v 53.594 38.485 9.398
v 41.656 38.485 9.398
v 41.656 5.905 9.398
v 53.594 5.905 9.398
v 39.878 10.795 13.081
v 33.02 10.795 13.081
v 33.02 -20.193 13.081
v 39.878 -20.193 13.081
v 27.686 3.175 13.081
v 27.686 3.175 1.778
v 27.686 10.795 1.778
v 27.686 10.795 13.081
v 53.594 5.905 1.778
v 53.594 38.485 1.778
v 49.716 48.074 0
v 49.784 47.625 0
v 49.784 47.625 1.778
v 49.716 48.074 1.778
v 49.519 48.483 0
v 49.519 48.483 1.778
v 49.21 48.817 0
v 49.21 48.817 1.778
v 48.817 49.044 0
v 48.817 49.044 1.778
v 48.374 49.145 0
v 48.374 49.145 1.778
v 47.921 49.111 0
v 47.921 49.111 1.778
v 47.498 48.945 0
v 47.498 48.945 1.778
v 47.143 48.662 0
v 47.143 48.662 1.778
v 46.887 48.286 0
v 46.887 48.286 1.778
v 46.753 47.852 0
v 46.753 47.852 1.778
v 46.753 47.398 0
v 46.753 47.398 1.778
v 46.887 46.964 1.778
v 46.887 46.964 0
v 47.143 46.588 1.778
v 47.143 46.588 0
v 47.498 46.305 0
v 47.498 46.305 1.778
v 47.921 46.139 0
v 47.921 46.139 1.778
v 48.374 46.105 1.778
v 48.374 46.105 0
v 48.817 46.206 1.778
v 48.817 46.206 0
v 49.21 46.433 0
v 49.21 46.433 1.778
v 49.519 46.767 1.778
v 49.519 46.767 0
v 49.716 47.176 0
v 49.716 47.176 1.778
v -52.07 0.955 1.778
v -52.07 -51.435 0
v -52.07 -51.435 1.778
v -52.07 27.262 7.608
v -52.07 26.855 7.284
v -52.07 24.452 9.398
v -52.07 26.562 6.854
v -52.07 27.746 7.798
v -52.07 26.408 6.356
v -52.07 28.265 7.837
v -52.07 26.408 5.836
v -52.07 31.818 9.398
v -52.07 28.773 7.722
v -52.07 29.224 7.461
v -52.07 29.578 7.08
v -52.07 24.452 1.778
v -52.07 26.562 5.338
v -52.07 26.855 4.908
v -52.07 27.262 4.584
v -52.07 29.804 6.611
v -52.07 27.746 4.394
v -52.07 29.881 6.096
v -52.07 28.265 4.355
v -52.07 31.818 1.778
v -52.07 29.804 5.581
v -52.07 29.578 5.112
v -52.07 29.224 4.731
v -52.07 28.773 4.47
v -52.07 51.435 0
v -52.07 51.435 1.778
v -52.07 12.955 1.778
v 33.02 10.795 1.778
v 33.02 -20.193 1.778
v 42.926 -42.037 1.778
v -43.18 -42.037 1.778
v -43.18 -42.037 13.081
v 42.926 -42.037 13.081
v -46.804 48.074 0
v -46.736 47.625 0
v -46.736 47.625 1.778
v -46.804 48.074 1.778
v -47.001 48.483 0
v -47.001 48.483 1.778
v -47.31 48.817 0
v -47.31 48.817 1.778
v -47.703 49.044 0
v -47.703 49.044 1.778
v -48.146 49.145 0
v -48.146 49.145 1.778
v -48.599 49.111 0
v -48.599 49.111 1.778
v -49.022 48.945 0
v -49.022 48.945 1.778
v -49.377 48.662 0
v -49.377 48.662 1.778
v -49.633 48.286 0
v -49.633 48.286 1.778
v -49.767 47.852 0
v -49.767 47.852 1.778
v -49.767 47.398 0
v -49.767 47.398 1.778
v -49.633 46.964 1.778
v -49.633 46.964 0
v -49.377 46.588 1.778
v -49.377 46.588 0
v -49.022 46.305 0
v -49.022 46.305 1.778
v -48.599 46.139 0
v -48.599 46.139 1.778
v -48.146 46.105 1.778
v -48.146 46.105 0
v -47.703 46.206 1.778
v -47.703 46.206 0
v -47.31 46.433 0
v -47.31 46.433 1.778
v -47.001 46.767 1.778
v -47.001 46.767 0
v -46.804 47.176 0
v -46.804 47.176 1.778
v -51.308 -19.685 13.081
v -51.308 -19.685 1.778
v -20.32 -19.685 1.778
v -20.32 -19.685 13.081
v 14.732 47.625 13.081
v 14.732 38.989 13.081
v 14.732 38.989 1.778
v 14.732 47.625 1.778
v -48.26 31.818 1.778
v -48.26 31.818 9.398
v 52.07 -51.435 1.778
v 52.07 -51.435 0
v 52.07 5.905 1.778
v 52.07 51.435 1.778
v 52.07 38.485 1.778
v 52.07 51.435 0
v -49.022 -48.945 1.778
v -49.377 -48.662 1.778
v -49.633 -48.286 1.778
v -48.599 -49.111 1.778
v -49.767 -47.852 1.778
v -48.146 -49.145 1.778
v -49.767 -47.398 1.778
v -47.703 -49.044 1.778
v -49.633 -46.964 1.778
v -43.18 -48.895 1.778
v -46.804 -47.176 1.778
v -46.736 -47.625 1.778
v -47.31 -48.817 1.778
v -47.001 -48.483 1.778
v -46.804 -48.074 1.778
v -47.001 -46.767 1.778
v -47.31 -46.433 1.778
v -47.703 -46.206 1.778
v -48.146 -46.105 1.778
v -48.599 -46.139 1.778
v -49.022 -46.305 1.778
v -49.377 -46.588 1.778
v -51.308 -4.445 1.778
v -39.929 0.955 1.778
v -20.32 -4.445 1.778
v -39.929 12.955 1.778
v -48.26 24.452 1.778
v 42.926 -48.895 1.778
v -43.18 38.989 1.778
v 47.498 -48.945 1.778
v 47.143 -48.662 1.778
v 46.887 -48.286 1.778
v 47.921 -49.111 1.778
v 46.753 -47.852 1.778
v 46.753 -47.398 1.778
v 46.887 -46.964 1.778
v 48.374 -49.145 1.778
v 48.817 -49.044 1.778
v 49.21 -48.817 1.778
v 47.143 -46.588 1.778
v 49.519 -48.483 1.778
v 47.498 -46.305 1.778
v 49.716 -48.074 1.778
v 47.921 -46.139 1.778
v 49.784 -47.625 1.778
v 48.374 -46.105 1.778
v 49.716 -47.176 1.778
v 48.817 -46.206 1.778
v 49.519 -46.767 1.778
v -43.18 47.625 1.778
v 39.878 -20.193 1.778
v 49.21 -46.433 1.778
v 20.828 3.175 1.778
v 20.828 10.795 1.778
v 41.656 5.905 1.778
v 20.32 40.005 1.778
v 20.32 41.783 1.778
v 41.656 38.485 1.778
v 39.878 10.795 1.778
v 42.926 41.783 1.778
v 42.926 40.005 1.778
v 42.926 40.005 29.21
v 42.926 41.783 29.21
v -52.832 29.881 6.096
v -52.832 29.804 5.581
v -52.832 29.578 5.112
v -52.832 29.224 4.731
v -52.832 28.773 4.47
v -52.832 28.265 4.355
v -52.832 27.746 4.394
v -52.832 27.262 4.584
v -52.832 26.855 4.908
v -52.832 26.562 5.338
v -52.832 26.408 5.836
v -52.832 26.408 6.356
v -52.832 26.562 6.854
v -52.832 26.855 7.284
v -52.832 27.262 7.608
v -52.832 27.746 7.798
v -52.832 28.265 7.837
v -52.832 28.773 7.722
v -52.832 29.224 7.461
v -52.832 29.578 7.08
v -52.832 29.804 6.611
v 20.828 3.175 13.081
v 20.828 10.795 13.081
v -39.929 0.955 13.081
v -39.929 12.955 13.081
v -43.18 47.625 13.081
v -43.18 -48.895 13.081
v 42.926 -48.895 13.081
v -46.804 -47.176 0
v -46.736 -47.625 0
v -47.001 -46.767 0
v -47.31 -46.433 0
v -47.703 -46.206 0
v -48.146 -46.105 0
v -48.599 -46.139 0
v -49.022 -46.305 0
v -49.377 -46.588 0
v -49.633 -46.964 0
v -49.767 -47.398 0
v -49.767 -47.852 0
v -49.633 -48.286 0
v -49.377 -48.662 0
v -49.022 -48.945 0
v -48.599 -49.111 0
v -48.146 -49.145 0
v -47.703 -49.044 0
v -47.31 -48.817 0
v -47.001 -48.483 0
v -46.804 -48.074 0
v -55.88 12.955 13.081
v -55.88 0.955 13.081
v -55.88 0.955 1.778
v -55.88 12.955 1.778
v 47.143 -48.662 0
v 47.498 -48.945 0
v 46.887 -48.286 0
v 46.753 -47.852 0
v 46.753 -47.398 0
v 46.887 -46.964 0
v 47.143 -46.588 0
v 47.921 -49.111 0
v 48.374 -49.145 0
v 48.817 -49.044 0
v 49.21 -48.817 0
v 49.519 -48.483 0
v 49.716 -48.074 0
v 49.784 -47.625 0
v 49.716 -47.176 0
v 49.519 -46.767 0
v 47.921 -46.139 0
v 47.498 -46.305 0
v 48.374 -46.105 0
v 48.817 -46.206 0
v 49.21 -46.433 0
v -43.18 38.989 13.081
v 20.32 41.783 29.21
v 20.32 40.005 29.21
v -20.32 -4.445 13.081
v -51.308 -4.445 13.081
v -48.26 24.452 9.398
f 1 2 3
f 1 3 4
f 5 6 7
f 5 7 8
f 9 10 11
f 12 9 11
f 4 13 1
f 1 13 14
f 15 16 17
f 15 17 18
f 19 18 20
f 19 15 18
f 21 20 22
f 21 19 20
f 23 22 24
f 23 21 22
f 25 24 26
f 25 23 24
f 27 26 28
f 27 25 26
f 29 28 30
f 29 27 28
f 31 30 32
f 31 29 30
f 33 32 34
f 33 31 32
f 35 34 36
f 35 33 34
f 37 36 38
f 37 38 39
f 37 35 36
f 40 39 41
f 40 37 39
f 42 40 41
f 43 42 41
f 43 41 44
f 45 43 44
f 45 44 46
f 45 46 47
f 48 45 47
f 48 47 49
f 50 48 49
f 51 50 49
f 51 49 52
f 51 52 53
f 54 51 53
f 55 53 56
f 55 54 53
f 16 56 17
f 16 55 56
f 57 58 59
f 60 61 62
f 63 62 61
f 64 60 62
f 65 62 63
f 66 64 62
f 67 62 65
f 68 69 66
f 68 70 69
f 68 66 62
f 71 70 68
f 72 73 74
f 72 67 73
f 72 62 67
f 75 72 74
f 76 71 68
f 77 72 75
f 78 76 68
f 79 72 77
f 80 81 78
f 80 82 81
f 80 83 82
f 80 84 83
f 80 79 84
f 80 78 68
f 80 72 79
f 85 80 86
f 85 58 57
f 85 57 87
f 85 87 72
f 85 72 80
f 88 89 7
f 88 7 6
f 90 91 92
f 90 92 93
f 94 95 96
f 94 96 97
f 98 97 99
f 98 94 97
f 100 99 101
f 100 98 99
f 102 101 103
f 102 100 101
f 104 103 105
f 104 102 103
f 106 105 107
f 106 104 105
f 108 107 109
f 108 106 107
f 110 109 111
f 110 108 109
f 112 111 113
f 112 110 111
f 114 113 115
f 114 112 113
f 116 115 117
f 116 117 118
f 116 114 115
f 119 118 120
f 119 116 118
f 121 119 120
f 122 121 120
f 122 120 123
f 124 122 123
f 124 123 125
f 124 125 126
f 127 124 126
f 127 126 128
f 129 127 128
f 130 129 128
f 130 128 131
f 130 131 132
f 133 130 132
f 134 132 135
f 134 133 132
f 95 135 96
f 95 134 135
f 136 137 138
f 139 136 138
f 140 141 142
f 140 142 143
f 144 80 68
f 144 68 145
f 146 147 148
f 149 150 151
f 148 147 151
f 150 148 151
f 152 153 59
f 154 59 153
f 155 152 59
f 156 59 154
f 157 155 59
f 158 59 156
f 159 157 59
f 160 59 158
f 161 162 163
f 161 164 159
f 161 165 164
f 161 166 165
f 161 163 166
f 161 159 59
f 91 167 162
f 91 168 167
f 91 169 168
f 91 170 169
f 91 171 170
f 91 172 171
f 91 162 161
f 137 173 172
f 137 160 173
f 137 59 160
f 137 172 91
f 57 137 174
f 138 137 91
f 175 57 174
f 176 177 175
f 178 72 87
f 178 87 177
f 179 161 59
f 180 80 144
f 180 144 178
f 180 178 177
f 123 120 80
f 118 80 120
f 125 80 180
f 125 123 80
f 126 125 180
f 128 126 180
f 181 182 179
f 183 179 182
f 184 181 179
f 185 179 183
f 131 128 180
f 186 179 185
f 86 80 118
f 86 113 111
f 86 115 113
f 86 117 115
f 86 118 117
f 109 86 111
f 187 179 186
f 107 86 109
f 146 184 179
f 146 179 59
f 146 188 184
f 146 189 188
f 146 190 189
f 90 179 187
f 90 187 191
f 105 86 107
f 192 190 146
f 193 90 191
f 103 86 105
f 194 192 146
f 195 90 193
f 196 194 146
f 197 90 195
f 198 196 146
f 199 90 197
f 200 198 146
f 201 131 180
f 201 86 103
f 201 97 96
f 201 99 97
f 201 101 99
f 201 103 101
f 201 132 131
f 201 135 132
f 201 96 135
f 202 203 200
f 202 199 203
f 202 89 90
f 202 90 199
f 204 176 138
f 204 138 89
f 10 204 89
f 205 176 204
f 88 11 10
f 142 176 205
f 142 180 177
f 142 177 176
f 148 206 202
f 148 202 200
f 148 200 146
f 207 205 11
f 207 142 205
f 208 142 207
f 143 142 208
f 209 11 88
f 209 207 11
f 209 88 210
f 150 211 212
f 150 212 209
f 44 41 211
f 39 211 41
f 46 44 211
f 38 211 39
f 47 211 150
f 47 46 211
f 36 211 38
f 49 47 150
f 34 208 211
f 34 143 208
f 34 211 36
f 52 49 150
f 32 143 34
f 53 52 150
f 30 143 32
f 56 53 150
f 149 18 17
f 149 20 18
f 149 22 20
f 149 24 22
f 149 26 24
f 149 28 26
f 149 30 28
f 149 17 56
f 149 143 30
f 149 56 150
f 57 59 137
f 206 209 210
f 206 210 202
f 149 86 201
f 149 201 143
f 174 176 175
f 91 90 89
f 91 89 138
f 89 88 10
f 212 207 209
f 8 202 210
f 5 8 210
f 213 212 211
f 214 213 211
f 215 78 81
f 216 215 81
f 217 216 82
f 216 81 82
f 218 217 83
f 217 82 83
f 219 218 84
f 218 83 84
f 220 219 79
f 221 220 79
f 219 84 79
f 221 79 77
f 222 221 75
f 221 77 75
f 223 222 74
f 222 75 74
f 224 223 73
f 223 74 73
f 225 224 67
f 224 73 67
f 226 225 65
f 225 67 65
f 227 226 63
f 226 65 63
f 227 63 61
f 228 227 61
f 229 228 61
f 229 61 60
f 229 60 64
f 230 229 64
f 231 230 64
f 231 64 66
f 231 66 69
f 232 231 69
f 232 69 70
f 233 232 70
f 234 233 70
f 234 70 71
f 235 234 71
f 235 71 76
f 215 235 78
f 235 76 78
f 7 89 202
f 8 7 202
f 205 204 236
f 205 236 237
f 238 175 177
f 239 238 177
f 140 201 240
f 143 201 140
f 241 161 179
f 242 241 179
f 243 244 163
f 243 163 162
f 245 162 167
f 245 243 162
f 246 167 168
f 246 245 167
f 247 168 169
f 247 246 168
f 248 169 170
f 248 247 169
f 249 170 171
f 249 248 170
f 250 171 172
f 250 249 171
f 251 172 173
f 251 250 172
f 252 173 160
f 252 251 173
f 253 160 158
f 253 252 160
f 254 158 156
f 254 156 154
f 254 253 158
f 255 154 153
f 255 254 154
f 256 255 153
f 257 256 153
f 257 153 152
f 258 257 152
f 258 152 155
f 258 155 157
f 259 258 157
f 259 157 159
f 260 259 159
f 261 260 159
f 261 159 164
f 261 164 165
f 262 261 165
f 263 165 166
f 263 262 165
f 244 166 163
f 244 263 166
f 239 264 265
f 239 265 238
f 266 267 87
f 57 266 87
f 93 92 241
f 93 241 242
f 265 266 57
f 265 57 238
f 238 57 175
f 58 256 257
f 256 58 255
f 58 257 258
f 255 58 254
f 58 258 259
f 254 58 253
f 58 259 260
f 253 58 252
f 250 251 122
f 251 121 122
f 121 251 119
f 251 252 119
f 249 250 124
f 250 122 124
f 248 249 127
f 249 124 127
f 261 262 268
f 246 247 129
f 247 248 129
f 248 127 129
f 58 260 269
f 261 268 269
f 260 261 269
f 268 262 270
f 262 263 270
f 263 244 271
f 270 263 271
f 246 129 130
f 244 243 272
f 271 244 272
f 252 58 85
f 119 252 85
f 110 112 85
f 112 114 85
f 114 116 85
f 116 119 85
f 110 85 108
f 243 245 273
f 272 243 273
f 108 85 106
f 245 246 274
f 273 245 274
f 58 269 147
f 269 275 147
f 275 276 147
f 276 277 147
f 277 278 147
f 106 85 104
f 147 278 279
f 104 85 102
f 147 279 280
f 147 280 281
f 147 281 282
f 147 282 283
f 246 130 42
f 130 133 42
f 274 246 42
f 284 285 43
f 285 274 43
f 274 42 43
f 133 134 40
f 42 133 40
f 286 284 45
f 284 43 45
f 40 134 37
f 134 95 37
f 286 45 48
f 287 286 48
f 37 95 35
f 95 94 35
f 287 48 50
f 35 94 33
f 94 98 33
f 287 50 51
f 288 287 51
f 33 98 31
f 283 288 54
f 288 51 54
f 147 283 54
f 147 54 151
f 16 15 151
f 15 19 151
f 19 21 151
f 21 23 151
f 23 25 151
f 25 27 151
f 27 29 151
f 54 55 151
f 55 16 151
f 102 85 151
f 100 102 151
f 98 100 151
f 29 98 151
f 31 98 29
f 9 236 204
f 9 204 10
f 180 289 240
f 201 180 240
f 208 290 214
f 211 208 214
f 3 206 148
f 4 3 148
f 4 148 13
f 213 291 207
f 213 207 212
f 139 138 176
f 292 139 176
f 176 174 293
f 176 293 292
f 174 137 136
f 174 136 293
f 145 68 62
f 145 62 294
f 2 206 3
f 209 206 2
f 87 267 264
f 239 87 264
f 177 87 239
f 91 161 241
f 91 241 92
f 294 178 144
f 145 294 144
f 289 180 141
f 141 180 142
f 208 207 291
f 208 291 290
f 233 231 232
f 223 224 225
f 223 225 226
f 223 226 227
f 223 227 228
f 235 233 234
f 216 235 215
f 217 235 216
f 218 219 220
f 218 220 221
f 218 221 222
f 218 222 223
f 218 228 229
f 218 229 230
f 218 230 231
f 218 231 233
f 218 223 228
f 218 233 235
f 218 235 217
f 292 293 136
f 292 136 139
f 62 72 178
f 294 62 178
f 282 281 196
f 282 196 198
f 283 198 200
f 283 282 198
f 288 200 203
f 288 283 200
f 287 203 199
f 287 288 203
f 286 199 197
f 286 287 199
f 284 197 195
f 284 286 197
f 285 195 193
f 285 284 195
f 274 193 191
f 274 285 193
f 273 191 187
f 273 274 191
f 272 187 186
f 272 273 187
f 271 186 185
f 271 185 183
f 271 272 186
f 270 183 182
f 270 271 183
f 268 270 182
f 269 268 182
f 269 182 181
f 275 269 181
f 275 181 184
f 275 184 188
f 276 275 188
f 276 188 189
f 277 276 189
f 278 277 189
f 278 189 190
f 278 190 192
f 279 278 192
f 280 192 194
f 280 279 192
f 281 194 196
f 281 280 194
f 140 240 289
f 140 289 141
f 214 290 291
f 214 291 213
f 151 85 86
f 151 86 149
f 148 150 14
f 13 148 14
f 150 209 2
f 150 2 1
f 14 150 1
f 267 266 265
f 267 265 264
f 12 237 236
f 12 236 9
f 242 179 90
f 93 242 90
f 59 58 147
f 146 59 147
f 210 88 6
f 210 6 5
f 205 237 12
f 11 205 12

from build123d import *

# Parameters (mm, degrees)
SKETCH1_W           = 104.14
SKETCH1_H           = 102.87
SKETCH1_R           = 1.524
BOSS_EXTRUDE1_DEPTH = 1.778
SKETCH2_W           = 57.912
SKETCH2_H           = 8.636
SKETCH2_W_2         = 15.9512
SKETCH2_H_2         = 12
SKETCH2_W_3         = 30.988
SKETCH2_H_3         = 15.24
SKETCH2_W_4         = 86.106
SKETCH2_H_4         = 6.858
SKETCH2_W_5         = 6.858
SKETCH2_H_5         = 30.988
SKETCH2_H_6         = 7.62
BOSS_EXTRUDE2_DEPTH = 11.303
SKETCH3_W           = 11.938
SKETCH3_H           = 32.58
SKETCH3_W_2         = 3.81
SKETCH3_H_2         = 7.366
BOSS_EXTRUDE3_DEPTH = 7.62
SKETCH4_R           = 1.74625
BOSS_EXTRUDE4_DEPTH = 0.762
SKETCH5_W           = 22.606
SKETCH5_H           = 1.778
BOSS_EXTRUDE5_DEPTH = 27.432


with BuildPart() as part:
    # Sketch1 → Boss-Extrude1 (new body)
    with BuildSketch(Plane.XY):
        Rectangle(SKETCH1_W, SKETCH1_H)
        with Locations((-48.26, 47.625)):
            Circle(SKETCH1_R, mode=Mode.SUBTRACT)
        with Locations((48.26, 47.625)):
            Circle(SKETCH1_R, mode=Mode.SUBTRACT)
        with Locations((48.26, -47.625)):
            Circle(SKETCH1_R, mode=Mode.SUBTRACT)
        with Locations((-48.26, -47.625)):
            Circle(SKETCH1_R, mode=Mode.SUBTRACT)
    extrude(amount=BOSS_EXTRUDE1_DEPTH)

    # Sketch2 → Boss-Extrude2 (add)
    with BuildSketch(Plane.XY.offset(1.778)):
        with Locations((-14.224, 43.307)):
            Rectangle(SKETCH2_W, SKETCH2_H)
        with Locations((-47.9044, 6.955)):
            Rectangle(SKETCH2_W_2, SKETCH2_H_2)
        with Locations((-35.814, -12.065)):
            Rectangle(SKETCH2_W_3, SKETCH2_H_3)
        with Locations((-0.127, -45.466)):
            Rectangle(SKETCH2_W_4, SKETCH2_H_4)
        with Locations((36.449, -4.699)):
            Rectangle(SKETCH2_W_5, SKETCH2_H_5)
        with Locations((24.257, 6.985)):
            Rectangle(SKETCH2_W_5, SKETCH2_H_6)
    extrude(amount=BOSS_EXTRUDE2_DEPTH)

    # Sketch3 → Boss-Extrude3 (add)
    with BuildSketch(Plane.XY.offset(1.778)):
        with Locations((47.625, 22.195)):
            Rectangle(SKETCH3_W, SKETCH3_H)
        with Locations((-50.165, 28.135)):
            Rectangle(SKETCH3_W_2, SKETCH3_H_2)
    extrude(amount=BOSS_EXTRUDE3_DEPTH)

    # Sketch4 → Boss-Extrude4 (add)
    with BuildSketch(Plane.ZY.offset(52.07)):
        with Locations(Location((6.096, 28.135, 0), (0, 0, 90))):  # turned: the seam where the file's is
            Circle(SKETCH4_R)
    extrude(amount=BOSS_EXTRUDE4_DEPTH)

    # Sketch5 → Boss-Extrude5 (add)
    with BuildSketch(Plane.XY.offset(1.778)):
        with Locations((31.623, 40.894)):
            Rectangle(SKETCH5_W, SKETCH5_H)
    extrude(amount=BOSS_EXTRUDE5_DEPTH)


solid = part.part
